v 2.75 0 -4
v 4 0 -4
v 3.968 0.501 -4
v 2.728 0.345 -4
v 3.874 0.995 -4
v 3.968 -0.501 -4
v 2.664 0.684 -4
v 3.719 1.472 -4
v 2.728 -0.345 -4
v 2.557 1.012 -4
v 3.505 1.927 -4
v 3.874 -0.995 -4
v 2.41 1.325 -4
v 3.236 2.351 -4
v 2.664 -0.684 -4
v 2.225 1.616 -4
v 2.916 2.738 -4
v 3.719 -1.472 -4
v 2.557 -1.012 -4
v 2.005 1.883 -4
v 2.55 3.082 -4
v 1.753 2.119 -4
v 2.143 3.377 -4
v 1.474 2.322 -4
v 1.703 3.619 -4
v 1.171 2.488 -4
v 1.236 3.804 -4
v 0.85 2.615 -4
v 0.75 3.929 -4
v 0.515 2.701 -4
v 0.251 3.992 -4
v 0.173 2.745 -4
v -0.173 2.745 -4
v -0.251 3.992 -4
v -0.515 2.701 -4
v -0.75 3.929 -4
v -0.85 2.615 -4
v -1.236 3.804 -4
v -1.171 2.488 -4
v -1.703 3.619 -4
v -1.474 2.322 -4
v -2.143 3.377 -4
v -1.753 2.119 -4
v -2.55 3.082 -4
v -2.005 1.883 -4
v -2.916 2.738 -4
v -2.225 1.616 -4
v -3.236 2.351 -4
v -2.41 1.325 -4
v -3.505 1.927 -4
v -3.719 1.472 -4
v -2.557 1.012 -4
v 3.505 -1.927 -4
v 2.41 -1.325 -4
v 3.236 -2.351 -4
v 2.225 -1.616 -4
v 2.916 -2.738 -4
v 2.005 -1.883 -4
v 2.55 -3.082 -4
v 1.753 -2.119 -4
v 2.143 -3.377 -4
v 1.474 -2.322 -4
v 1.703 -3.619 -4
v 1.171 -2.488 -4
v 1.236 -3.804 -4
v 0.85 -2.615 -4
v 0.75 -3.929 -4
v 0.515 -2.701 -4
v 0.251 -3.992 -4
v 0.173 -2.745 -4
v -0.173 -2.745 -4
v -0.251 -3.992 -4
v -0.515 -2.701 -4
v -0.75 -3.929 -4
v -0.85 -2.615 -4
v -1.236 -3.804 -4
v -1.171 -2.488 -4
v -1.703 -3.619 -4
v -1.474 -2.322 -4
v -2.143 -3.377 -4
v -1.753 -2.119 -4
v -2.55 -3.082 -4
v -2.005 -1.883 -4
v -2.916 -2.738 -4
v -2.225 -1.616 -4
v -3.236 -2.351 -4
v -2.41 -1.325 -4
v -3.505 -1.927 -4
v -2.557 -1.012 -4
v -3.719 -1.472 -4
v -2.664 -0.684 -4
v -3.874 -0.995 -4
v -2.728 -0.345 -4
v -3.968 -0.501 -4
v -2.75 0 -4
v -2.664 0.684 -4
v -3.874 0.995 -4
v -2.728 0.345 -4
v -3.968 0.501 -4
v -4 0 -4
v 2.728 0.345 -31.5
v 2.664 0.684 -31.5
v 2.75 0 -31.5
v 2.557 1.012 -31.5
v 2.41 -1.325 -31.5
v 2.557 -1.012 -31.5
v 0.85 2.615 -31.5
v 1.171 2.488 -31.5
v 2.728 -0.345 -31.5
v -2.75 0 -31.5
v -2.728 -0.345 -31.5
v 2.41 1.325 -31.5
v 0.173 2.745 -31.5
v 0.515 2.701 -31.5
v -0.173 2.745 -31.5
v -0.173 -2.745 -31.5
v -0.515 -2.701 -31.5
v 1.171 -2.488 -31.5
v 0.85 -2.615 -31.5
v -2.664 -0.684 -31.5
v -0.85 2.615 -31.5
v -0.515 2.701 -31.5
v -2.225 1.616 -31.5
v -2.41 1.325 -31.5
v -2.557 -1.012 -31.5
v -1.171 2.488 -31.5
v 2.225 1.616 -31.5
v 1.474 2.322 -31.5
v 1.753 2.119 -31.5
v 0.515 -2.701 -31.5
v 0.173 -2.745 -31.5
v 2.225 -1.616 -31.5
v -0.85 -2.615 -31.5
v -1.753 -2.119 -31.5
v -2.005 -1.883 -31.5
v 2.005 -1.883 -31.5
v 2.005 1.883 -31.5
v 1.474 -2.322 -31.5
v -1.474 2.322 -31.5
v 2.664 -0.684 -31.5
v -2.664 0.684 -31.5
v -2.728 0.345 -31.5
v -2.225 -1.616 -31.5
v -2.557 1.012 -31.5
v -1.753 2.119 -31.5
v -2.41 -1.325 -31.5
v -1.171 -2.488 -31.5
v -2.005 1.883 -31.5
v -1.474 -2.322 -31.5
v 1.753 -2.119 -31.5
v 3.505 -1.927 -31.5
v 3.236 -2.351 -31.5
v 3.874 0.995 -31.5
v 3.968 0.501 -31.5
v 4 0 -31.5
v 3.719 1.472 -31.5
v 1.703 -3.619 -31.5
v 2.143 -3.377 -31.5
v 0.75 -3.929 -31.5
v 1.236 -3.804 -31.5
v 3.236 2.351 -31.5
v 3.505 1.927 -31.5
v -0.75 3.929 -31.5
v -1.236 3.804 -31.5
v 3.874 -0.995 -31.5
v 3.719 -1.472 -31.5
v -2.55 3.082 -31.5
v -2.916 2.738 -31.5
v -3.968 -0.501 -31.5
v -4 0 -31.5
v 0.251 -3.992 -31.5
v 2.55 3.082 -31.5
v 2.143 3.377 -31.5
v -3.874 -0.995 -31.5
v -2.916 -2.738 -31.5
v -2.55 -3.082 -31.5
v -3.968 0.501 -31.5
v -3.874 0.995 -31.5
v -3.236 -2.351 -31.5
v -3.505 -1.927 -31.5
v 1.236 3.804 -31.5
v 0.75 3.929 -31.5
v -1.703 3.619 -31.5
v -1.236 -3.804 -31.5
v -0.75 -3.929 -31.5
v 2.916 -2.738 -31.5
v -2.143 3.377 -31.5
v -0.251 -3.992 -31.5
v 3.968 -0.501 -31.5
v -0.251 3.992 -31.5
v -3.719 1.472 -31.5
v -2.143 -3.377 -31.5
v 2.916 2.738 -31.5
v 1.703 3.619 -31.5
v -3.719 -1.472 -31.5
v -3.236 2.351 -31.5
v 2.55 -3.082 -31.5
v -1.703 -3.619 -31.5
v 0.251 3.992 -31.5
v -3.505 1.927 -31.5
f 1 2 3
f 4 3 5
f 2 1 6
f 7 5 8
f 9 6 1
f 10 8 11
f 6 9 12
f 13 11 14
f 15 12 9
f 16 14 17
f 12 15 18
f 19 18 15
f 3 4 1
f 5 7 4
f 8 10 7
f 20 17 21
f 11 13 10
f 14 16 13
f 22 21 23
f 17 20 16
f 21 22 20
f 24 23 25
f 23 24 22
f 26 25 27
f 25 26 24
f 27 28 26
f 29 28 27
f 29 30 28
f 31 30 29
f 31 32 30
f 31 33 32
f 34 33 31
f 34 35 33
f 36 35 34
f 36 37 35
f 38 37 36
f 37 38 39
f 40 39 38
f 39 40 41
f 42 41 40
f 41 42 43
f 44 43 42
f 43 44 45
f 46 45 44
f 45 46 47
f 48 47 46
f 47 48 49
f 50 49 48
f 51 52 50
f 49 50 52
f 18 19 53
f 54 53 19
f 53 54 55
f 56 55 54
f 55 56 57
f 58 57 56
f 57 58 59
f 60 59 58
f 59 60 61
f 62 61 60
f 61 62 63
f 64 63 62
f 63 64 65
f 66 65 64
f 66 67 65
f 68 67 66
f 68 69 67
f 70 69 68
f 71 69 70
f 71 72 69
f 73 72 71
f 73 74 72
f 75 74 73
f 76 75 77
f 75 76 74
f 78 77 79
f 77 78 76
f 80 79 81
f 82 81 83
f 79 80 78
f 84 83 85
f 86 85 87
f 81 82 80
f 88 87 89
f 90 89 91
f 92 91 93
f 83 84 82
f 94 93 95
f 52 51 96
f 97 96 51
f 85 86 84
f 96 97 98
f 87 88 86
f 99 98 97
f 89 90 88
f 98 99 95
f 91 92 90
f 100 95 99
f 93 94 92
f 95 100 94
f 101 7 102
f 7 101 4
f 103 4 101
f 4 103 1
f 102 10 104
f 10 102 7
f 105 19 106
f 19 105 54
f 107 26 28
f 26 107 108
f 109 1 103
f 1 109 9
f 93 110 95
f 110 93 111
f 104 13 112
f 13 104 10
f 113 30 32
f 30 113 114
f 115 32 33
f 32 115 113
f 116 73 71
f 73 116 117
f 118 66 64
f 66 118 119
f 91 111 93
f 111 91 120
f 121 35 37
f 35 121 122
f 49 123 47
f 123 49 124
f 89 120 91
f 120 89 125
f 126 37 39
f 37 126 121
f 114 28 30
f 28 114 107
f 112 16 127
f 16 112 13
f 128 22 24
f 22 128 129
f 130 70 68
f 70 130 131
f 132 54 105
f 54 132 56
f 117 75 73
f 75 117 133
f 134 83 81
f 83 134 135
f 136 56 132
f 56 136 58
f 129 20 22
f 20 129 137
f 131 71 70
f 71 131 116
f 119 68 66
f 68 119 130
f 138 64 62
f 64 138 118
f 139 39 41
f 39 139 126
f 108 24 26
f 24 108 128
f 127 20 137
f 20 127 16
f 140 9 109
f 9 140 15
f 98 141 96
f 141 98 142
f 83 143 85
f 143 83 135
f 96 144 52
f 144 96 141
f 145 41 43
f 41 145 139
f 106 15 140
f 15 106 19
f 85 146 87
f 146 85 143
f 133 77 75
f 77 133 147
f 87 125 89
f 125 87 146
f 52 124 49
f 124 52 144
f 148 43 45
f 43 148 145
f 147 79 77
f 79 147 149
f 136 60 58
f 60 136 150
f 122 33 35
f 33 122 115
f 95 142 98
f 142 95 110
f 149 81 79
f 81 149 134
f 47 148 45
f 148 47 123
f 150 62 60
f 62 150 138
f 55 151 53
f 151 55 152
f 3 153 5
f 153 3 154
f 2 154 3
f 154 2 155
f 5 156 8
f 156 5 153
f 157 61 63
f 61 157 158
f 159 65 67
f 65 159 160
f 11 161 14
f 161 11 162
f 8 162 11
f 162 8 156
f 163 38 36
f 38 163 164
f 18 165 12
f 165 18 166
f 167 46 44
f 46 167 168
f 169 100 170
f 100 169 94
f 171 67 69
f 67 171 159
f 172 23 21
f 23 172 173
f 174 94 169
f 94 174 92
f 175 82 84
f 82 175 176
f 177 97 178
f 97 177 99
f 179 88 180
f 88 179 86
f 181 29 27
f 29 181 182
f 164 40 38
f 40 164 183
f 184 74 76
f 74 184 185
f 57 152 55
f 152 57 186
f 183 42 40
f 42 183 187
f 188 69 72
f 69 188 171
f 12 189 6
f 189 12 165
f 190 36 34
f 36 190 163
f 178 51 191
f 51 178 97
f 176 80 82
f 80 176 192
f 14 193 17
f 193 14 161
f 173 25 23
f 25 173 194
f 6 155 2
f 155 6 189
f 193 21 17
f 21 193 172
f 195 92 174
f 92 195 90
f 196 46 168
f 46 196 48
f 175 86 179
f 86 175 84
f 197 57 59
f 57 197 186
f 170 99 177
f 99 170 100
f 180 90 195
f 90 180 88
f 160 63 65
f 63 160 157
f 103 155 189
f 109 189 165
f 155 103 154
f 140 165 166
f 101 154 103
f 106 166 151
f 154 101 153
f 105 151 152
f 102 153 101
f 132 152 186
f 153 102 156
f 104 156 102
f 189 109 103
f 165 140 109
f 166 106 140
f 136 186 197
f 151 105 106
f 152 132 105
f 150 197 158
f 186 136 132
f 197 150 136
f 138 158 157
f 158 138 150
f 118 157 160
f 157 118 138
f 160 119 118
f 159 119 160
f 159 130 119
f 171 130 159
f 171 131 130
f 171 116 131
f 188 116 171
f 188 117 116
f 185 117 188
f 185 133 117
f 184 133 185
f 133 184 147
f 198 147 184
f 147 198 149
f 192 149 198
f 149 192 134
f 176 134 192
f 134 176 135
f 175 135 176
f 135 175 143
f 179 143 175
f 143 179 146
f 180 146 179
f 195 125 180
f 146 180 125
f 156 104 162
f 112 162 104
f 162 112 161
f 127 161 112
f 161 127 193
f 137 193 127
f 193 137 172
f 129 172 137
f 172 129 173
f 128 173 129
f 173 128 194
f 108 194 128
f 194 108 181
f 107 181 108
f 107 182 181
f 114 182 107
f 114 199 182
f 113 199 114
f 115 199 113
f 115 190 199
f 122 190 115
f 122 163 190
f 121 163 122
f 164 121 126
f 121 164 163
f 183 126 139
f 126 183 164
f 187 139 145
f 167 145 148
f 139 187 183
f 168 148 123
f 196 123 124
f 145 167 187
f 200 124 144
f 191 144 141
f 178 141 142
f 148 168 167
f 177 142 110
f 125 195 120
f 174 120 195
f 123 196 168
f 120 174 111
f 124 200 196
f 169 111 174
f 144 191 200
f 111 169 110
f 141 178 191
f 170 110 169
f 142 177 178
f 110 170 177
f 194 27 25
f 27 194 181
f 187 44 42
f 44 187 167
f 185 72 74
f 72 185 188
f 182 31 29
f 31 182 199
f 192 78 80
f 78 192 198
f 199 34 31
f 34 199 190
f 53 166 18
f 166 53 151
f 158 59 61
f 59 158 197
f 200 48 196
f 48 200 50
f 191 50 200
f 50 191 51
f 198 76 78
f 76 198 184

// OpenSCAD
$fn = 50;

difference() {
	union() {
		translate(v = [0, 0, -31.5]) {
			cylinder(h = 34.5, r = 4.0);
		}
	}
	union() {
		translate(v = [0, 0, 0]) {
			rotate(a = [0, 0, 0]) {
				difference() {
					union() {
						translate(v = [0, 0, -4]) {
							linear_extrude(height = 4) {
								polygon(points = [[4.8468, 0.0], [2.4234000000000004, 4.197451927062417], [-2.423399999999999, 4.197451927062417], [-4.8468, 5.935618106107392e-16], [-2.423400000000002, -4.197451927062416], [2.423399999999997, -4.197451927062419]]);
							}
						}
					}
					union();
				}
			}
		}
		#cylinder(h = 3, r = 6.25);
		#translate(v = [0, 0, -100.0]) {
			cylinder(h = 200, r = 2.75);
		}
	}
}
